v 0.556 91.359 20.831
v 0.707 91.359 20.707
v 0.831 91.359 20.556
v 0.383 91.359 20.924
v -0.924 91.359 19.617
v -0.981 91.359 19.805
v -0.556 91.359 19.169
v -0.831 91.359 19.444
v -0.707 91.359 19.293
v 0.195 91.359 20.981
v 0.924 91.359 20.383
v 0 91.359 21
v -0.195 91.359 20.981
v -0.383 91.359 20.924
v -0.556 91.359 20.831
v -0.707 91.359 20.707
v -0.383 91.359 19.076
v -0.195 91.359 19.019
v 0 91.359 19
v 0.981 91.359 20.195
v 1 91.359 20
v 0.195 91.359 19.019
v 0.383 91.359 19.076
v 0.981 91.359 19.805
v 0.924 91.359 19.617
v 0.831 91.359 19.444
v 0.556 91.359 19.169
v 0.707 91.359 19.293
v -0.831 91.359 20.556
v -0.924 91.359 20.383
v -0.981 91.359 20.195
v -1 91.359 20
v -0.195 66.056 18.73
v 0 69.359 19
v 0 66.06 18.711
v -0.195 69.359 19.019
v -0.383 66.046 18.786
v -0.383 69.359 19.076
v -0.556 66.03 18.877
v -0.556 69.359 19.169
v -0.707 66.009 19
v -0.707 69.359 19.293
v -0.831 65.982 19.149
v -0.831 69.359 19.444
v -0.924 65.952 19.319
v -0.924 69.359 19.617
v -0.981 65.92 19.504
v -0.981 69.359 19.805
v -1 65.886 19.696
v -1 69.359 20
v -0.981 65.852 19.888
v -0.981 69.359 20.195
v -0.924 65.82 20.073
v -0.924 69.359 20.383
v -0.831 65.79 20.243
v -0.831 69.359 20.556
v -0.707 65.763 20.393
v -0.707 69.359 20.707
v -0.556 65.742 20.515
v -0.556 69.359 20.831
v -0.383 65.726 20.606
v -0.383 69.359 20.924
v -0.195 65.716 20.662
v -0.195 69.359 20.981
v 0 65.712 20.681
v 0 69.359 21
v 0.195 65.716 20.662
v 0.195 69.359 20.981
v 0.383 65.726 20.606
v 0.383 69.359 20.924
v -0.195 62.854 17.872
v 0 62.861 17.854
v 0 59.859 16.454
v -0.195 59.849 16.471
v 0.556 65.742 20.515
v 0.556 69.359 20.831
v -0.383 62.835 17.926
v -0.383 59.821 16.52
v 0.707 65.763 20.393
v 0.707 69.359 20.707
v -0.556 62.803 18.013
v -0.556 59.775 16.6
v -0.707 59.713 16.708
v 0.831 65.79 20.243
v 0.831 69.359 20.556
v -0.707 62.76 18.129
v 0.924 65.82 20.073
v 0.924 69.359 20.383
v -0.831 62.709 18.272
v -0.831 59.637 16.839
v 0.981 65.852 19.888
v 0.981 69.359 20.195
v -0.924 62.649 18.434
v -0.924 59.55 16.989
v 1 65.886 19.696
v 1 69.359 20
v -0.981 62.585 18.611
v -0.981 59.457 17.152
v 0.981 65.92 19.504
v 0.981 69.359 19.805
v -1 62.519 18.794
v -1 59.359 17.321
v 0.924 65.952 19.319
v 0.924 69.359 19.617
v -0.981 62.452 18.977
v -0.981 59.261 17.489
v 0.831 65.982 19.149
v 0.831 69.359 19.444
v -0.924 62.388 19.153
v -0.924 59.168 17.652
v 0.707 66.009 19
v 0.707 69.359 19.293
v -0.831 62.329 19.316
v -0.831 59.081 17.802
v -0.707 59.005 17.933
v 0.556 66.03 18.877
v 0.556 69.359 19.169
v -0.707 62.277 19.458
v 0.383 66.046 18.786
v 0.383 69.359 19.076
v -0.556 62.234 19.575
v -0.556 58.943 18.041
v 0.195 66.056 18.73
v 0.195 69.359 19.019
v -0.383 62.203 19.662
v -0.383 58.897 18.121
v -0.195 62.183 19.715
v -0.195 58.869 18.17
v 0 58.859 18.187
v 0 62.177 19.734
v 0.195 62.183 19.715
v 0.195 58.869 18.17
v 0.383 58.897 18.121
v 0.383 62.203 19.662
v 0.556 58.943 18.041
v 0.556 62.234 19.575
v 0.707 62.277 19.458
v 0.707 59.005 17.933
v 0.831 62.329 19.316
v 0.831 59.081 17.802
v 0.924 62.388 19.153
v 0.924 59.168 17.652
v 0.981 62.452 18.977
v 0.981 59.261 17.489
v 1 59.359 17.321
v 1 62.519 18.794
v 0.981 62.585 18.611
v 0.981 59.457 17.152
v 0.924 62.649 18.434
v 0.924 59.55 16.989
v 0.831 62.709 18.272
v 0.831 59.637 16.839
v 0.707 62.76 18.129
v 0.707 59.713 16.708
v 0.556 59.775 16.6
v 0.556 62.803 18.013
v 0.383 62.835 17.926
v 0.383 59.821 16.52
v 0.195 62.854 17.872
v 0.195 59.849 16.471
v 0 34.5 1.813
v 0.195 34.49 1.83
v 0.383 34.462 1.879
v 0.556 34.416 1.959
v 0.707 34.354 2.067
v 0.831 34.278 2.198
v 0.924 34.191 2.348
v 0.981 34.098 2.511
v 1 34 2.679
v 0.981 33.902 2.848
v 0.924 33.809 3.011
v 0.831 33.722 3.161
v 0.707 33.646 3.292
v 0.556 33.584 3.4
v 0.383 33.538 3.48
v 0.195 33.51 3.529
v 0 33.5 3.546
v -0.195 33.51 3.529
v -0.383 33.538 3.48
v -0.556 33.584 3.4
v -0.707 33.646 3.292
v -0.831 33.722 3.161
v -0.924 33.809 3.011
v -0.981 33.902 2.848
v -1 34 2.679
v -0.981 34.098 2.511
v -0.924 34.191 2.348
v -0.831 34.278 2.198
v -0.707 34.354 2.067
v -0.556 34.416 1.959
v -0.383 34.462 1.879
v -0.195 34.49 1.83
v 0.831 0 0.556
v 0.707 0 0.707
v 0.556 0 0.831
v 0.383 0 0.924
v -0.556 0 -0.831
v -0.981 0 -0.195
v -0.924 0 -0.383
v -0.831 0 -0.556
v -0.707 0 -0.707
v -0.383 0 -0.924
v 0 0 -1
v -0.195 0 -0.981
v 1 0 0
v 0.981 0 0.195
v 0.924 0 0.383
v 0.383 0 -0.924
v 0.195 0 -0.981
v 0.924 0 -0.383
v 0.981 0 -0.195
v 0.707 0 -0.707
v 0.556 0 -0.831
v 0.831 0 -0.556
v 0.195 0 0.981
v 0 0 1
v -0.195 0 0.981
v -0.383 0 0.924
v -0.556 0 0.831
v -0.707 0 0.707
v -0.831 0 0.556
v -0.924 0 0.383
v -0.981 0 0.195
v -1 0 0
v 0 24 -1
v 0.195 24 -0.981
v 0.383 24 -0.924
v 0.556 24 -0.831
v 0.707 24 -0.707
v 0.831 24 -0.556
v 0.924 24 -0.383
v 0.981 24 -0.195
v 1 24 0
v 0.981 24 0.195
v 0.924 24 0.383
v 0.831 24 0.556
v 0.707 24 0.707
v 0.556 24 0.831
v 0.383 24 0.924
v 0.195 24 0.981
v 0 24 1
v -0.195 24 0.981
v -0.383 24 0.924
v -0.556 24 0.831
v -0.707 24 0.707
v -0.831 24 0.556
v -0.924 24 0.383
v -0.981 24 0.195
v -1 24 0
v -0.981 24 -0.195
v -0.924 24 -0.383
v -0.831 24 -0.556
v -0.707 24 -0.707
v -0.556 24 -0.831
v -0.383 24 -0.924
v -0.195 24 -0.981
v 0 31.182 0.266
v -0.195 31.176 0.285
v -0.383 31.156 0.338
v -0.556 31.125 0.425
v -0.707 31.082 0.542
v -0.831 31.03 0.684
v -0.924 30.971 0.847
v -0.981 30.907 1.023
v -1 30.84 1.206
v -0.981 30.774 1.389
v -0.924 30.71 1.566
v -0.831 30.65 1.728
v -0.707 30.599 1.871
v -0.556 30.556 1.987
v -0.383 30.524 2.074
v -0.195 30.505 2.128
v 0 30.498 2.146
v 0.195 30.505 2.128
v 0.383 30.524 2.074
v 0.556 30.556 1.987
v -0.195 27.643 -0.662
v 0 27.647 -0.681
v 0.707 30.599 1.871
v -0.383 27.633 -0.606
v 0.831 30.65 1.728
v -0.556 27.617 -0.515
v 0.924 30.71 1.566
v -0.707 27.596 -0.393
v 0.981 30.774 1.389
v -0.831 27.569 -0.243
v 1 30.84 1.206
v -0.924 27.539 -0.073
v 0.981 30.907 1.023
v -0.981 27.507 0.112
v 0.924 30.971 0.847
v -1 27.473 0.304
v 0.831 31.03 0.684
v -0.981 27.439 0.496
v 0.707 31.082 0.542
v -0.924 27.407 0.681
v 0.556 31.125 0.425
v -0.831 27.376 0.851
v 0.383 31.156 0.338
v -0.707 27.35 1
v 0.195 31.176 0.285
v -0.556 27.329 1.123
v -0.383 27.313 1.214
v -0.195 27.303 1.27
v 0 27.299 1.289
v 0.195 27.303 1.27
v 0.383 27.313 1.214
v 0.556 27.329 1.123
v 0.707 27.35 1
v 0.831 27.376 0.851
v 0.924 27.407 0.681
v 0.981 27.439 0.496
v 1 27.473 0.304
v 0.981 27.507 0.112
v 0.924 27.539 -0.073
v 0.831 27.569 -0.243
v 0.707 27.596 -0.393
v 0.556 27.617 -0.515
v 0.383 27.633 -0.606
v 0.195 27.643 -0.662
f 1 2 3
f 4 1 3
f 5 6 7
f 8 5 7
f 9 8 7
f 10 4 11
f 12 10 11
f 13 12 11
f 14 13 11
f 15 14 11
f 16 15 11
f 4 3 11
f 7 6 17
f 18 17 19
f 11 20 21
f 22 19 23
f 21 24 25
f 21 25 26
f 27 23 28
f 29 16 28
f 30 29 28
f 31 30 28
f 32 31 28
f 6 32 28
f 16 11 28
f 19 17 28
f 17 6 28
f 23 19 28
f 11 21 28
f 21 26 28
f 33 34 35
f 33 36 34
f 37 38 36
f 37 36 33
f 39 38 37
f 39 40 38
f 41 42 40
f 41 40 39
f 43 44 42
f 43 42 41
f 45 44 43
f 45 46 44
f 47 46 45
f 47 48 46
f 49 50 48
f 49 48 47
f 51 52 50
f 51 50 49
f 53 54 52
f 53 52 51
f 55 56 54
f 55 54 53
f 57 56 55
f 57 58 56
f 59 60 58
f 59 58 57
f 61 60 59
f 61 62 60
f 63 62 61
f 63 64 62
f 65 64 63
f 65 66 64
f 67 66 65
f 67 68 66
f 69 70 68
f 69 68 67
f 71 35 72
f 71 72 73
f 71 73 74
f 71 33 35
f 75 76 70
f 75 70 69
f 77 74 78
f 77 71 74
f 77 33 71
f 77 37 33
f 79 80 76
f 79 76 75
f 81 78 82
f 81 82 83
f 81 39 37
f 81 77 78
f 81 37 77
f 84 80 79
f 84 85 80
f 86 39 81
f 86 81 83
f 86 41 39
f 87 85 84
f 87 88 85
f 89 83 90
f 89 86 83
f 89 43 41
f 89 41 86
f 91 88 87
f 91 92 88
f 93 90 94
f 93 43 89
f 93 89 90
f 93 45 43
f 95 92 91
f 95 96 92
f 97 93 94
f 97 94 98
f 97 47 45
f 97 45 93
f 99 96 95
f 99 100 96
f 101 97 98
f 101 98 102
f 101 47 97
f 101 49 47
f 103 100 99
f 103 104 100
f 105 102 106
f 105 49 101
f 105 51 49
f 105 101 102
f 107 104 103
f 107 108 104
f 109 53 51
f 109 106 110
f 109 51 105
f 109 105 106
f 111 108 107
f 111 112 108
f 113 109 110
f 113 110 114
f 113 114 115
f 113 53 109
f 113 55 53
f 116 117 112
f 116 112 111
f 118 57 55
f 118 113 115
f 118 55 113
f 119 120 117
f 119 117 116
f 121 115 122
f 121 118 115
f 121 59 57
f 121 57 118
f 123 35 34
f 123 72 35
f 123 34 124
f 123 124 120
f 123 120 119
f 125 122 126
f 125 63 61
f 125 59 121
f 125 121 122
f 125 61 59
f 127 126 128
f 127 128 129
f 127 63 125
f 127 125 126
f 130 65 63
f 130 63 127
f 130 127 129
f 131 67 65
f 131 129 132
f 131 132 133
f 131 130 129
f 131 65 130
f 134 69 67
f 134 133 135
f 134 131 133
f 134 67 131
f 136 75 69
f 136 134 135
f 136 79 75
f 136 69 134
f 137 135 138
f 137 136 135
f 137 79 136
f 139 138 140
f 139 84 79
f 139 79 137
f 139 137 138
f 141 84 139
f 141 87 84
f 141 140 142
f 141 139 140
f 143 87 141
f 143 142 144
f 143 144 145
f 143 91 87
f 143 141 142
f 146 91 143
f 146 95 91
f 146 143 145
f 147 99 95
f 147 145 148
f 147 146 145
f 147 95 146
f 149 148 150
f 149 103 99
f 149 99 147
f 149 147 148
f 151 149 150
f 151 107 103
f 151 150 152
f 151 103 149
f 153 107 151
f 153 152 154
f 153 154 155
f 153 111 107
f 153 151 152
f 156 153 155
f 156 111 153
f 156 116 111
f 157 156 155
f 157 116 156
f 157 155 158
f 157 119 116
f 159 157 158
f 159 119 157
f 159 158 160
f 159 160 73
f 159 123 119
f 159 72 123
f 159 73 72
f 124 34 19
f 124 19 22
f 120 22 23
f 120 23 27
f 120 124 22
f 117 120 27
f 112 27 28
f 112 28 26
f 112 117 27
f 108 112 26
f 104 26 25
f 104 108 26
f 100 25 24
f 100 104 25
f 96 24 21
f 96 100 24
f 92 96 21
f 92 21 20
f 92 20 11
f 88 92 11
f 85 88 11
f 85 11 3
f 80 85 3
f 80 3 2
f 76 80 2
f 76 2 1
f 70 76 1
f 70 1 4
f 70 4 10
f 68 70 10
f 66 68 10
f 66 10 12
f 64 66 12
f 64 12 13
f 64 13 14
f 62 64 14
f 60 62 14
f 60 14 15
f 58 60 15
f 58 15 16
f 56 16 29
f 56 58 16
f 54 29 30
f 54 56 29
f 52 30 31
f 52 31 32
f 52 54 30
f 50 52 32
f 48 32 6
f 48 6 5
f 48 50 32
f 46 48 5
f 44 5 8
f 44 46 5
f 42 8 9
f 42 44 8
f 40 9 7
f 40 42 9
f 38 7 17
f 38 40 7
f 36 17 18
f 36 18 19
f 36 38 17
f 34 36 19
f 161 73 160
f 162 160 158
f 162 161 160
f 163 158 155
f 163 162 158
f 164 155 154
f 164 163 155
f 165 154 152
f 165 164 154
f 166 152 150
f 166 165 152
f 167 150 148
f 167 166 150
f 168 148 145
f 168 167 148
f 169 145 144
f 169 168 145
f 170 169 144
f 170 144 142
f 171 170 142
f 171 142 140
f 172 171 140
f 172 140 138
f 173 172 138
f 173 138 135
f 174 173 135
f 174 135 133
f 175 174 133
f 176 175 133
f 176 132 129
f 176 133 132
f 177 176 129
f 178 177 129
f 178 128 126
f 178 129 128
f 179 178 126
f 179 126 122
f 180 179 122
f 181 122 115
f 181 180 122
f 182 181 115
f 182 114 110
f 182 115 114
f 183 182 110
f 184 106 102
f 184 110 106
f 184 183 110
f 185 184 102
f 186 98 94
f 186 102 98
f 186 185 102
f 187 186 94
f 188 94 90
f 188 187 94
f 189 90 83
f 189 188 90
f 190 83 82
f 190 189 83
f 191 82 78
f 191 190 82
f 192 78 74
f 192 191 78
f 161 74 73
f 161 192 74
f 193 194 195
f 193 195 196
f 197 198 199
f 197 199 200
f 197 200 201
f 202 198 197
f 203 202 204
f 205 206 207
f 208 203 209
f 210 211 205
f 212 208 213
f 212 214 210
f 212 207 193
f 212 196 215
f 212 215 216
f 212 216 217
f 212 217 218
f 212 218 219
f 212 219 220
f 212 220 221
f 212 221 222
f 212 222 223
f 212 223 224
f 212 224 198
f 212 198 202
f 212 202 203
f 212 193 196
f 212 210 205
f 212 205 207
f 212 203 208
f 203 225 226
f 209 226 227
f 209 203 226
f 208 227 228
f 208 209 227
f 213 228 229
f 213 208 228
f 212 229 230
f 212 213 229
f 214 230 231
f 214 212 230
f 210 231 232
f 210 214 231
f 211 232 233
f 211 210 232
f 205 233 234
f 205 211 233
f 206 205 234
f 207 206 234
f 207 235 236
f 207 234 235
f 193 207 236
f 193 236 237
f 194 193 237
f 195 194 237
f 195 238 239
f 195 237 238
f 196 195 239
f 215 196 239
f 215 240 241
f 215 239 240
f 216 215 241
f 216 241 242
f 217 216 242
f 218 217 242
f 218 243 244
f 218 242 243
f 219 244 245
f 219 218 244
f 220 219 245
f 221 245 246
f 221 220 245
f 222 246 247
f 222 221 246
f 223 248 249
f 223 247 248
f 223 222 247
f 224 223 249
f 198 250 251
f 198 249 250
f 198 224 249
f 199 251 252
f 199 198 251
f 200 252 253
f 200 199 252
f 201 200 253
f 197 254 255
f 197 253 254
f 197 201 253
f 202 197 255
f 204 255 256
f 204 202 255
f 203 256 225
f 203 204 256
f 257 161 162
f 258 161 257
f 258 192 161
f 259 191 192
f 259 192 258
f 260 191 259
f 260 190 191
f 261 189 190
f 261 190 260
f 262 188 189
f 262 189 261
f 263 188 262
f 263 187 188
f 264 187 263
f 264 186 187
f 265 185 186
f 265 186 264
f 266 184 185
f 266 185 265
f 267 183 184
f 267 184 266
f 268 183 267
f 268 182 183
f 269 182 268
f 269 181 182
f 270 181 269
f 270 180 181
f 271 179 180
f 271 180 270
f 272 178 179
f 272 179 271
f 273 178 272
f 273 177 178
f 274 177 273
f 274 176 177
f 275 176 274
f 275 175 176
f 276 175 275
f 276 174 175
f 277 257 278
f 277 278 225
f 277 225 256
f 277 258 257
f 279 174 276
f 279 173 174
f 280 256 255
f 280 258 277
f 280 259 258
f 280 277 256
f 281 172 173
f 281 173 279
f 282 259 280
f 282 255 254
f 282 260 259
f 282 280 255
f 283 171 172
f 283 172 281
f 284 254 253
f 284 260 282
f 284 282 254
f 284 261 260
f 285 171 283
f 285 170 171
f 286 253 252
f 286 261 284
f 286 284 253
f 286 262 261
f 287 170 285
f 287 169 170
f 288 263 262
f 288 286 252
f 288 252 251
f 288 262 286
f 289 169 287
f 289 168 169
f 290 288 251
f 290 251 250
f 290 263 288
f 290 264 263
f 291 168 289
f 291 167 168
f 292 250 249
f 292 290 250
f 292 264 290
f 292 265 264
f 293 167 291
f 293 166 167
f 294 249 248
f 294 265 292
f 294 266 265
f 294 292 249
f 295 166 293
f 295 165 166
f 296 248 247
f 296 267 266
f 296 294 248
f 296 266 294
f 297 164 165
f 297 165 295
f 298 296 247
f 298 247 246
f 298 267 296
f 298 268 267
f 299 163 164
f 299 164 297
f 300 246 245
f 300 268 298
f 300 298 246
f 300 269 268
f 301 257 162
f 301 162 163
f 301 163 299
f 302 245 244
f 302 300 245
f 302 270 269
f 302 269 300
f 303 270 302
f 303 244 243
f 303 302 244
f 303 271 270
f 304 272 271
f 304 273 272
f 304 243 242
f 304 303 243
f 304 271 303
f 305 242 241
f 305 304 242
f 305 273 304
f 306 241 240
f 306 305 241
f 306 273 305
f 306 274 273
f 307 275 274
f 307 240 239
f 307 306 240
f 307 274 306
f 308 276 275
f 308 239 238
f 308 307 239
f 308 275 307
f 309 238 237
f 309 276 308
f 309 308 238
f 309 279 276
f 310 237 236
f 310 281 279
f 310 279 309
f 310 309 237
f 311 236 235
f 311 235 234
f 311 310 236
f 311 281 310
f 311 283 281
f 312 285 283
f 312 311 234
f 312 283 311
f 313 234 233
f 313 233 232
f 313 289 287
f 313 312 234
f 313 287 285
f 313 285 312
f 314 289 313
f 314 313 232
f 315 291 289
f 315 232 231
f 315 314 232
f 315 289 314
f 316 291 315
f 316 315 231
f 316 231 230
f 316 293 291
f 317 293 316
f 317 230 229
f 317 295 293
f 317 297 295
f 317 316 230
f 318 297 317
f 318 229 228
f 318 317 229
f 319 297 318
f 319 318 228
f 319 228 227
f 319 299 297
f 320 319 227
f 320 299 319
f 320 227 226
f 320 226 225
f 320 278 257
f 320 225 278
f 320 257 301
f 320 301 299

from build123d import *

# Parameters (mm, degrees)
SWEEP1_PROFILE_R = 1


with BuildPart() as part:
    # Sweep1: sweep along a path in Sketch2
    with BuildLine(Plane(origin=(0, 0, 0), x_dir=(0, 0, -1), z_dir=(1, 0, 0))) as sweep1_path:
        Line((-20, 91.358983849), (-20, 69.358983849))
        ThreePointArc((-20, 69.358983849), (-19.318516526, 64.182602947), (-17.320508076, 59.358983849))
        Line((-17.320508076, 59.358983849), (-2.679491924, 34))
        ThreePointArc((-2.679491924, 34), (-0.681483474, 29.176380902), (0, 24))
        Line((0, 24), (0, 2))
        Line((0, 2), (0, 0))
    # Sweep1 profile (on start of the path) → Sweep1 (sweep)
    with BuildSketch(Plane(origin=(0, 91.358983849, 20), x_dir=(0, 0, -1), z_dir=(0, -1, 0))):
        Circle(SWEEP1_PROFILE_R)
    sweep(path=sweep1_path.line)


solid = part.part
